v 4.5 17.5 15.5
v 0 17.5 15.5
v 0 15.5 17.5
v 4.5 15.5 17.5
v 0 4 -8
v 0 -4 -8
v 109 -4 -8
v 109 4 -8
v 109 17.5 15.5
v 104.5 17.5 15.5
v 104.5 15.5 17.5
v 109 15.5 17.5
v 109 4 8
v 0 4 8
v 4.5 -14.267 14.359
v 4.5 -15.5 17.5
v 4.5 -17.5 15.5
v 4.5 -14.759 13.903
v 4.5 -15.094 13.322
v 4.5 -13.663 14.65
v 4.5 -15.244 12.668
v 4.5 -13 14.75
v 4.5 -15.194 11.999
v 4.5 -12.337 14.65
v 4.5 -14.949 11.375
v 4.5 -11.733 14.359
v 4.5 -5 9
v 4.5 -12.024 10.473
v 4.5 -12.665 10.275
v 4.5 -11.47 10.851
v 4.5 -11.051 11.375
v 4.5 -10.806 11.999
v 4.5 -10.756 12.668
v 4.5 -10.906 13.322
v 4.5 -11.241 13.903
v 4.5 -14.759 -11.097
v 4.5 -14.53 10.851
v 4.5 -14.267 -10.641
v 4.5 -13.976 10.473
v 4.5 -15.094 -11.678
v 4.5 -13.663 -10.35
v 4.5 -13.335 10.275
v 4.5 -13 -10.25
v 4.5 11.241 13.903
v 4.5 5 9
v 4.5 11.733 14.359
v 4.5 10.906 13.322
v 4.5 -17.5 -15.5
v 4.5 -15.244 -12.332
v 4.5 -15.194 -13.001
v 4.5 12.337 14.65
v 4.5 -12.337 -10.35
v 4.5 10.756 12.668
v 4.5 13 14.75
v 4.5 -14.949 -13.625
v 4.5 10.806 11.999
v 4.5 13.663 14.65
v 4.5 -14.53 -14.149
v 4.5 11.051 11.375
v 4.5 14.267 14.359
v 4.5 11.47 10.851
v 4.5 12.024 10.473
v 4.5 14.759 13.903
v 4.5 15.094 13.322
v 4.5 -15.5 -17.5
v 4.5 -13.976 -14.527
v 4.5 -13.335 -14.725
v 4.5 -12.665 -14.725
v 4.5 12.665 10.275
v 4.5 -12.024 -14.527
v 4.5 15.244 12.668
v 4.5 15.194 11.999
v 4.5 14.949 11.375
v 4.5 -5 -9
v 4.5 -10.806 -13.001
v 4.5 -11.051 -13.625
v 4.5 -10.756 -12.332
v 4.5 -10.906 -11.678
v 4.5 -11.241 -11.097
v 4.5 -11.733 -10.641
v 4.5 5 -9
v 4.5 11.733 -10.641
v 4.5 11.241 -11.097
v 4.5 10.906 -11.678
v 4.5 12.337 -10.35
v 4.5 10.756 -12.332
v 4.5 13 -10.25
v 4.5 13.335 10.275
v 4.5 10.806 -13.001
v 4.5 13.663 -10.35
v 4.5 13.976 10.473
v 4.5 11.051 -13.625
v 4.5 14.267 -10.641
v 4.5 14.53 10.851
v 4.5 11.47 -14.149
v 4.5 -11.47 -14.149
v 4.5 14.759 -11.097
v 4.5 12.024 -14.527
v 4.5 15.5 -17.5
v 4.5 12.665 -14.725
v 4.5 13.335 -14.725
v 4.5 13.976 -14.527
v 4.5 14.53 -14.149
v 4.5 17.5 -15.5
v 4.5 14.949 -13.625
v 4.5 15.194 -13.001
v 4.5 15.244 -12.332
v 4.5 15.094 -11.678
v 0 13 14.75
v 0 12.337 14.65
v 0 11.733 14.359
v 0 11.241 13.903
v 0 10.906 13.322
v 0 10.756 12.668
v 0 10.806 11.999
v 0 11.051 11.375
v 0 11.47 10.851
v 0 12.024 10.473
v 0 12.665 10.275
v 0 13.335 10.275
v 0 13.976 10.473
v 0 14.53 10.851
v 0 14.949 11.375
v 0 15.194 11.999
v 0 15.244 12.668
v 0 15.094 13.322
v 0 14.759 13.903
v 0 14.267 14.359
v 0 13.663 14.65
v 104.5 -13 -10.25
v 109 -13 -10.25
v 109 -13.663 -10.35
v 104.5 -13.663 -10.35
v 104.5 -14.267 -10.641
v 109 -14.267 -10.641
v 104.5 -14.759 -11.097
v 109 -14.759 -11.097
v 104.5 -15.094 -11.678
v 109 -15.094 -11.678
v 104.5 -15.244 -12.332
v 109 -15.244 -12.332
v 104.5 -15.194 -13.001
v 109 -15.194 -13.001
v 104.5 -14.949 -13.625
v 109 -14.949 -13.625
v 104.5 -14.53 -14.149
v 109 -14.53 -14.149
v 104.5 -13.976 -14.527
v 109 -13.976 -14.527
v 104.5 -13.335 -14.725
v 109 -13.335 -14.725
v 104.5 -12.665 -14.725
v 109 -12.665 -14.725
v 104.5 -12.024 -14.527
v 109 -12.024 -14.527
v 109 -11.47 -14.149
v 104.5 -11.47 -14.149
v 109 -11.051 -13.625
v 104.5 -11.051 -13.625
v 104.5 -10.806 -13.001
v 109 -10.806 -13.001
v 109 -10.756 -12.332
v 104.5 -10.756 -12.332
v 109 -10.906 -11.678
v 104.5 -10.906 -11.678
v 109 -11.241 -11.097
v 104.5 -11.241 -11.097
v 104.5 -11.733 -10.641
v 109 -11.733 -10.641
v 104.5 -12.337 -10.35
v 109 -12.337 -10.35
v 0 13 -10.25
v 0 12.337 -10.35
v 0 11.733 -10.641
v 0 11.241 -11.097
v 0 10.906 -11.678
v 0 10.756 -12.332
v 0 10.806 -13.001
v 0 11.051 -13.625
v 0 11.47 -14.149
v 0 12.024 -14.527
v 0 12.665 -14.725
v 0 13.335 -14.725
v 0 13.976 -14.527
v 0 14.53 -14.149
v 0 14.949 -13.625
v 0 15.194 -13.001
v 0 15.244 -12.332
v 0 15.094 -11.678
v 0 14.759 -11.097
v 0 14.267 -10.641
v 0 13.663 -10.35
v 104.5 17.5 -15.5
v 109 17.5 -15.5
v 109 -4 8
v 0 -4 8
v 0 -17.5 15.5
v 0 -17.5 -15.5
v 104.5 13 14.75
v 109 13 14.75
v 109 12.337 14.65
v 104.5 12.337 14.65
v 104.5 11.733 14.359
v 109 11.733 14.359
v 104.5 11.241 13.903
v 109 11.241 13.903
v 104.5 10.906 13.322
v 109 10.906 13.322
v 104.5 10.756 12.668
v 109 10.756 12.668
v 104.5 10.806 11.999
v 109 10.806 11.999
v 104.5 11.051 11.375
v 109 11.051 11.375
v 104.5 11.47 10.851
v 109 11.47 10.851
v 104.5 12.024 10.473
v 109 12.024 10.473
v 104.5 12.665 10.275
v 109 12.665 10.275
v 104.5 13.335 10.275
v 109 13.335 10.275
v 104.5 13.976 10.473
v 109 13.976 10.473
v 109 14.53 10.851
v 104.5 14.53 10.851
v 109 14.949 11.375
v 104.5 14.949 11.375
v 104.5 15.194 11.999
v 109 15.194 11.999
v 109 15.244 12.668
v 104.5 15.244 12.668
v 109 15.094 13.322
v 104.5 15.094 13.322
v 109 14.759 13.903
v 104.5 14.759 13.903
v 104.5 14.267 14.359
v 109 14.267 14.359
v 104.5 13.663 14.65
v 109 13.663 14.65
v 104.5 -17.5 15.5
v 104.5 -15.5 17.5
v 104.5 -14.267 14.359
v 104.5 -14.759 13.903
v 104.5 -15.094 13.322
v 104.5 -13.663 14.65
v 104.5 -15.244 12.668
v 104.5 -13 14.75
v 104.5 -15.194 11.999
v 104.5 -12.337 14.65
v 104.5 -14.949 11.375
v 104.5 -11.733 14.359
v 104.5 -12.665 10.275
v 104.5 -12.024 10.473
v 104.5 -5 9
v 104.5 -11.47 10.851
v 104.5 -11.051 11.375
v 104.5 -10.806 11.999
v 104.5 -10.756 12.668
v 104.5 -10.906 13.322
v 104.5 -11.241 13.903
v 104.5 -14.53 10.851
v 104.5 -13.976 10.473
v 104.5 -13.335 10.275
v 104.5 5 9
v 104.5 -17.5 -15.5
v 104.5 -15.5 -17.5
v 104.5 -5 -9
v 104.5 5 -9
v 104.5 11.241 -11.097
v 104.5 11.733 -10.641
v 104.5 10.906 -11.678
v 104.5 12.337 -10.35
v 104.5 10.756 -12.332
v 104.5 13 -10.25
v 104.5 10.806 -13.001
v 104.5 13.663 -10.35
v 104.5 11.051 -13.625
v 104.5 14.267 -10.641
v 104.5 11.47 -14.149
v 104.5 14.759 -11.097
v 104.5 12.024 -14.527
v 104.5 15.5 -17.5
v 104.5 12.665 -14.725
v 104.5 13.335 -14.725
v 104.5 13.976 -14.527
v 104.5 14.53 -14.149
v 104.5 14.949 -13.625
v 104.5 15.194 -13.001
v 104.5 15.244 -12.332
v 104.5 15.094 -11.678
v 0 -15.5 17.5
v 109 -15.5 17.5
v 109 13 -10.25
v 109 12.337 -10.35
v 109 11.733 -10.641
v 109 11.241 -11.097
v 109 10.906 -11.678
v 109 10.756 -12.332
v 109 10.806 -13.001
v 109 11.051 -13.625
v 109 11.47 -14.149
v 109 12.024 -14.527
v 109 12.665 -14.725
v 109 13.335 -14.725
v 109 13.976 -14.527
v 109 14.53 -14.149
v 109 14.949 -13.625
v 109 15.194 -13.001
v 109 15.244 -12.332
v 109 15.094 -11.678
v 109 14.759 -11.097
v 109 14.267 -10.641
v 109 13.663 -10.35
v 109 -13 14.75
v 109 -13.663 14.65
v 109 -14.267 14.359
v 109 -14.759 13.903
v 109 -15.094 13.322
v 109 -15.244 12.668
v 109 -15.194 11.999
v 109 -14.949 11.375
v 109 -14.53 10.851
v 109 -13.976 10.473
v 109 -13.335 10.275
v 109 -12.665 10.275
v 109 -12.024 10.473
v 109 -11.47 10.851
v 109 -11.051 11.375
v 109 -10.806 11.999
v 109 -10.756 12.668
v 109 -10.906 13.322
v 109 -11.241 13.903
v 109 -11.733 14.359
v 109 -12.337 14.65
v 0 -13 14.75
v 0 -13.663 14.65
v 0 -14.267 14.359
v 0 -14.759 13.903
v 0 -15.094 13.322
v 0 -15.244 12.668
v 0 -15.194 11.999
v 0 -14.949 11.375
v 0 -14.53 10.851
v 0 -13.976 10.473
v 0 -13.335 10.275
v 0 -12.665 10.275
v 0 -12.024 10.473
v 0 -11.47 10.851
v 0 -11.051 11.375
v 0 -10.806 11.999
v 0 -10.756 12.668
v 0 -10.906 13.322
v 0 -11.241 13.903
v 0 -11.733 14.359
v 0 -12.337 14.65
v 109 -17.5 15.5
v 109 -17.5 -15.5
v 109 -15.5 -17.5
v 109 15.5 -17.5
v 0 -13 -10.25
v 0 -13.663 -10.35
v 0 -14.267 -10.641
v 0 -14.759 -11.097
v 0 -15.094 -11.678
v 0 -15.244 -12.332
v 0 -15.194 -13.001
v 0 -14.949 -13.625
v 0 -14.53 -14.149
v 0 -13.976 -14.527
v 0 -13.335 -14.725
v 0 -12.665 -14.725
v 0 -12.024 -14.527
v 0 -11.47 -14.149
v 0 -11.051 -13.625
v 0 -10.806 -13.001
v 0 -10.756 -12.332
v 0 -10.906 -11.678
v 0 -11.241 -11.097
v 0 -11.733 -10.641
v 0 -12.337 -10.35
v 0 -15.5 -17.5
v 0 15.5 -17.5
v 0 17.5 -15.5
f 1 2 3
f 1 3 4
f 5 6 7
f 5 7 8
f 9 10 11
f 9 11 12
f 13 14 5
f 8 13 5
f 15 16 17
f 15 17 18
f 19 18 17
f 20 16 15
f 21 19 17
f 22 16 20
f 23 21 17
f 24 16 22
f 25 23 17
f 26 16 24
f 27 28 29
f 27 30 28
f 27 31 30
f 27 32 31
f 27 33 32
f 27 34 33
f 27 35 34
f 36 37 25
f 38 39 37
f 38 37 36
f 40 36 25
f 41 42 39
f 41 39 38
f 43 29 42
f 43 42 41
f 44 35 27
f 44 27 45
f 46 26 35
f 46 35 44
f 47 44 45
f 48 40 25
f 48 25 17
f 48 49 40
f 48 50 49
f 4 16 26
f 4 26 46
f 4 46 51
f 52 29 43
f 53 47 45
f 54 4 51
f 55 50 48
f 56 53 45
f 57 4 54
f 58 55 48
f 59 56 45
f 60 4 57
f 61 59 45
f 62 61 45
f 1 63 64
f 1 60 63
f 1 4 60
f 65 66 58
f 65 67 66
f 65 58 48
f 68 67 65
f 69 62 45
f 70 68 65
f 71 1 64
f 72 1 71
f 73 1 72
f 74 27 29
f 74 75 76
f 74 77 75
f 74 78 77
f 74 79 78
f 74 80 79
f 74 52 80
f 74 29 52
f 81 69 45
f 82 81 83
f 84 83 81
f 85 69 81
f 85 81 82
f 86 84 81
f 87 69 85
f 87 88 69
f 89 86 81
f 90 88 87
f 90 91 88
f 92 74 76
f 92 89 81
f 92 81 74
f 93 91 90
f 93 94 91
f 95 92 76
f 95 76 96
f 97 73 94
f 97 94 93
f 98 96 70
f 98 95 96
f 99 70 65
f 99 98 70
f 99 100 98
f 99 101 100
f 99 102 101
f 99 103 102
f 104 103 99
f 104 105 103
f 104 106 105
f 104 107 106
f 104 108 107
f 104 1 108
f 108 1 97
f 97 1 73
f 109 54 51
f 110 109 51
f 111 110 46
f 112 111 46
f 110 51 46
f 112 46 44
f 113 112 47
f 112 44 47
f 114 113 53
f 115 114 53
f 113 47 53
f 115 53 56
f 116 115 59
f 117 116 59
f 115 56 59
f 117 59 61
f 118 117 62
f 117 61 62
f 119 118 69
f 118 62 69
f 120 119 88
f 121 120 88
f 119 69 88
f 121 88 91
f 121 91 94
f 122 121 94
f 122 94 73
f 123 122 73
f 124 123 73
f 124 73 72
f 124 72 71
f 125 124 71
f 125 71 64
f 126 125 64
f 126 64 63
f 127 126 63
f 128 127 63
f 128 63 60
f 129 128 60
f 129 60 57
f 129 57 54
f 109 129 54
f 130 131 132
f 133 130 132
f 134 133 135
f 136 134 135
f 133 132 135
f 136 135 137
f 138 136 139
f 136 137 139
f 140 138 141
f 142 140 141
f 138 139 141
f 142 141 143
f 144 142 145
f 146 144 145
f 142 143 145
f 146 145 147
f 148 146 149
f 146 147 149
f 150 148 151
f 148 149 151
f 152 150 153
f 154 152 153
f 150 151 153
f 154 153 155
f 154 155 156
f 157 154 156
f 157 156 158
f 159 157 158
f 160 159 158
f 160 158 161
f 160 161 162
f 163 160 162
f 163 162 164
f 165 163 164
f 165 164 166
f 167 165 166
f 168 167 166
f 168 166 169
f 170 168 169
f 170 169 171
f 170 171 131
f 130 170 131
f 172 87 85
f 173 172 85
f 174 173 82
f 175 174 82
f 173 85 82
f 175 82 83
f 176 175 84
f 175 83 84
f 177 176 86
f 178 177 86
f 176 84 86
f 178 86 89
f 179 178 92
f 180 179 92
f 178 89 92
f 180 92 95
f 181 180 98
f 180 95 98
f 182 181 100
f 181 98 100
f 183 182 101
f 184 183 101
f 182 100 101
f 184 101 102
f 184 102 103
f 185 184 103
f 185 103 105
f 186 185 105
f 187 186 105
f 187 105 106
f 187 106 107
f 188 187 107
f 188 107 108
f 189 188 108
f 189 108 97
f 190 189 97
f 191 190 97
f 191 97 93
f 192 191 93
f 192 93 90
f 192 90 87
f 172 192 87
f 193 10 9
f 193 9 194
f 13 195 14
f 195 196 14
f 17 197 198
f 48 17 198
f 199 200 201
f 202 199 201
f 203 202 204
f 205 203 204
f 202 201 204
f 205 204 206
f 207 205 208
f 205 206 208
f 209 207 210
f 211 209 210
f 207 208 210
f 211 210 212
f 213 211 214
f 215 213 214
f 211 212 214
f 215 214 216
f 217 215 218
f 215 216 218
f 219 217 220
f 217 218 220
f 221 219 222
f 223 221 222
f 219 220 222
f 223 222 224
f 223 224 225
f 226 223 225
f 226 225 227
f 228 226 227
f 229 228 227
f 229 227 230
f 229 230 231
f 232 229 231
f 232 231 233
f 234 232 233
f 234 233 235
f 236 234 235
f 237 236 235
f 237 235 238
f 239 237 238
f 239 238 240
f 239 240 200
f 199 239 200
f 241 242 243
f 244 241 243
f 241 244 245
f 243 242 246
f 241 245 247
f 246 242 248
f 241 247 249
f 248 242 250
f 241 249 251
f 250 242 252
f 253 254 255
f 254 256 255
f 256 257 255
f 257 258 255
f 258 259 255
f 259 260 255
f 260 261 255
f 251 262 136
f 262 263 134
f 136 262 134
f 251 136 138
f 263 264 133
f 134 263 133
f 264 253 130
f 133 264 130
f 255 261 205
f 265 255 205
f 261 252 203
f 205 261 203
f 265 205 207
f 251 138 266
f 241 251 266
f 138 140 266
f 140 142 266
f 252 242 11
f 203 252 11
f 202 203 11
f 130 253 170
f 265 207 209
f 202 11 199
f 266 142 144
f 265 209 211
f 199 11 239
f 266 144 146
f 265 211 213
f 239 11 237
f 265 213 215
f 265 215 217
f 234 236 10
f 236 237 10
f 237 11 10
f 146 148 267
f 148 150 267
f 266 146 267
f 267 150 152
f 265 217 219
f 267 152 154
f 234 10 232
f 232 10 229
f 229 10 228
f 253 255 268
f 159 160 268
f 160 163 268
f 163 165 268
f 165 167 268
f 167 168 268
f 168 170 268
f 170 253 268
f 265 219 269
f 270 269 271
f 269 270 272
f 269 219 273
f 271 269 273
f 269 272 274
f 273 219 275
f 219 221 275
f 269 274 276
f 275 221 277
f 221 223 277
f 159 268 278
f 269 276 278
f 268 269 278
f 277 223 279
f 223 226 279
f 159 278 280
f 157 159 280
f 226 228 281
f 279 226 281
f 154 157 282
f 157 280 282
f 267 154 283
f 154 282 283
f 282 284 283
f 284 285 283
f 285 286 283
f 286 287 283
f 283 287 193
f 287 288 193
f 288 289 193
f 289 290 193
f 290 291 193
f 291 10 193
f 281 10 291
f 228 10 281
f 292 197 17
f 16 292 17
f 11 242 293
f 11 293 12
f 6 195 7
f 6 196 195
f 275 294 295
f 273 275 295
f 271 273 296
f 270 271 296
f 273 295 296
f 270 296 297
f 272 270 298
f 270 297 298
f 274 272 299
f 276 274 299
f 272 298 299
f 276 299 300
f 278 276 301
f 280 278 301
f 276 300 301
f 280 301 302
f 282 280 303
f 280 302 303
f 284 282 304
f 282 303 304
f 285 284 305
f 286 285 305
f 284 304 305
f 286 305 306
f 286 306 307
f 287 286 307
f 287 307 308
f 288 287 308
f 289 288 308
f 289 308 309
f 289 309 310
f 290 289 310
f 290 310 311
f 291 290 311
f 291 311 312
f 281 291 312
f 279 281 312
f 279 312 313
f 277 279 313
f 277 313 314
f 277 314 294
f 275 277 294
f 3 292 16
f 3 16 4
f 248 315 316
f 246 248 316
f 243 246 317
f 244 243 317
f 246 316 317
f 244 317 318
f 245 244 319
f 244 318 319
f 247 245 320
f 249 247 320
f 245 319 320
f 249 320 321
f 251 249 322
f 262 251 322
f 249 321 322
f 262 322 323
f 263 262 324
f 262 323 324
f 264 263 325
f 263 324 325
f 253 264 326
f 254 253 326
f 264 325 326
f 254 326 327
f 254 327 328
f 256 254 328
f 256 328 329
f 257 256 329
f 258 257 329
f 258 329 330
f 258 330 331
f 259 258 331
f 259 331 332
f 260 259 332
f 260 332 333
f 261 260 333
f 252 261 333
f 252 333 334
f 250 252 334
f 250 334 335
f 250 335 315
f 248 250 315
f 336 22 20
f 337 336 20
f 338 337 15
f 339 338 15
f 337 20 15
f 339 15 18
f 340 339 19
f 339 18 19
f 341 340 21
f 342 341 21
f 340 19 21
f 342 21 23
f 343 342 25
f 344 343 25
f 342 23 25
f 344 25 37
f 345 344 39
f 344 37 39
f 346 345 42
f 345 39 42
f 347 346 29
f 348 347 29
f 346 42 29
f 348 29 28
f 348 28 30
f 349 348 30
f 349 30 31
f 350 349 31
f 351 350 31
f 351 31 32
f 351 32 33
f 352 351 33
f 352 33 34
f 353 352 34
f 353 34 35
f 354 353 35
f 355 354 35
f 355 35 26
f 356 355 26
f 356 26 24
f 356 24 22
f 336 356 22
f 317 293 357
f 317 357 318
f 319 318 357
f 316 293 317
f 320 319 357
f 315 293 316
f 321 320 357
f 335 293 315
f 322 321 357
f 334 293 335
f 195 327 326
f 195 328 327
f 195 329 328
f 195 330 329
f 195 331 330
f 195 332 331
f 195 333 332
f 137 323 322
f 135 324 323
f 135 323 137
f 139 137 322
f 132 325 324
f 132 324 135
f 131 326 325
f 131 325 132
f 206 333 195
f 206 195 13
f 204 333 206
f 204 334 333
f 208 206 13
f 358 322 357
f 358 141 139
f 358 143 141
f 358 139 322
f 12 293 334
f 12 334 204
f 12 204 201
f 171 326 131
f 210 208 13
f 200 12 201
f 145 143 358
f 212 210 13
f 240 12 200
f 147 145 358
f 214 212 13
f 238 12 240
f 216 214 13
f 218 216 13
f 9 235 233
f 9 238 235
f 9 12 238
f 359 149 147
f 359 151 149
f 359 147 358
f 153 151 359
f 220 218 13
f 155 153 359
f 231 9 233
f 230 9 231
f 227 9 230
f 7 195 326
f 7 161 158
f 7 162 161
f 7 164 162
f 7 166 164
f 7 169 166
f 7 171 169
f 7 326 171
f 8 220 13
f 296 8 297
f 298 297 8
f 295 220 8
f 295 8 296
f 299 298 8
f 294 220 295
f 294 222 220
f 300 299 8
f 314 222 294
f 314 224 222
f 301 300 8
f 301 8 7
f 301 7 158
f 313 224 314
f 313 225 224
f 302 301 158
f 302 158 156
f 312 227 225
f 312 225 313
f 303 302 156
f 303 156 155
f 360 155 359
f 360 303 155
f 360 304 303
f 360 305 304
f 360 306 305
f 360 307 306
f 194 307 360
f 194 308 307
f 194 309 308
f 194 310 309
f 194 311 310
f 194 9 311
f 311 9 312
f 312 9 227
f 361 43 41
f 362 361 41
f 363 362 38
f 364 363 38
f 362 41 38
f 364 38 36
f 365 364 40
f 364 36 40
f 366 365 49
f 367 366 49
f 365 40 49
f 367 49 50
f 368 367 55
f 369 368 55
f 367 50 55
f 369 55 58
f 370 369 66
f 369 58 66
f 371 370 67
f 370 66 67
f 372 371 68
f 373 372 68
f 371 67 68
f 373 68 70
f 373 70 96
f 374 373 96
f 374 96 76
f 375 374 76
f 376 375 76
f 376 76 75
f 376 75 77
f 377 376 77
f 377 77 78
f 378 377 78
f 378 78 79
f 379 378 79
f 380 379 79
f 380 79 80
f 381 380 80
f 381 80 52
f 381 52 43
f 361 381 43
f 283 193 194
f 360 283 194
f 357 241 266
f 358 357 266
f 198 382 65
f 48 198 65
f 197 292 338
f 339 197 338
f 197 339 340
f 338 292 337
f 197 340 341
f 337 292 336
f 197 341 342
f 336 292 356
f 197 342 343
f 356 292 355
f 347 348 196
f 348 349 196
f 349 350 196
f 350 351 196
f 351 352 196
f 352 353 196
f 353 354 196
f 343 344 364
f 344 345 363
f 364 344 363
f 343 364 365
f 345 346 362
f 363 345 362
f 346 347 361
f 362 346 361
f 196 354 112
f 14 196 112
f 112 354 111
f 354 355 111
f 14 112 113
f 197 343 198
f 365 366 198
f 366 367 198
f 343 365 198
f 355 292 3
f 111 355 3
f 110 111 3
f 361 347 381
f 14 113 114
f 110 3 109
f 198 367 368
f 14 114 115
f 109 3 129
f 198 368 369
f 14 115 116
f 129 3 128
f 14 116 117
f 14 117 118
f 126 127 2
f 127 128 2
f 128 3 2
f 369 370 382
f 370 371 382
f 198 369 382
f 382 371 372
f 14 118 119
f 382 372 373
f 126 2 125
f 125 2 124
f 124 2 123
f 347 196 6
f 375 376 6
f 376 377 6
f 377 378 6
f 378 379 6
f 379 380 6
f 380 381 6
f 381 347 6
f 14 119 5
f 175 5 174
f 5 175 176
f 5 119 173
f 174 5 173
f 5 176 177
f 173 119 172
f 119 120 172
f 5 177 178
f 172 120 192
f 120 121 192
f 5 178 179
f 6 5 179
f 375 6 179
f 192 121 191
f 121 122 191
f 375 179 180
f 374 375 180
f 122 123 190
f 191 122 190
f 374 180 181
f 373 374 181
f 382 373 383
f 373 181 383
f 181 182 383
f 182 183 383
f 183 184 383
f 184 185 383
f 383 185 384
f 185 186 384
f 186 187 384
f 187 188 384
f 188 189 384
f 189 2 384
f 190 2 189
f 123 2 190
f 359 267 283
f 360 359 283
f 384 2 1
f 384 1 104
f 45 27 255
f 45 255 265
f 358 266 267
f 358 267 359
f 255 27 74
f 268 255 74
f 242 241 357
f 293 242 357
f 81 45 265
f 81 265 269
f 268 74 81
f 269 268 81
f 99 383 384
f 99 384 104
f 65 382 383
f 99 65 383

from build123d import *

# Parameters (mm, degrees)
SKETCH_1_W                  = 35
SKETCH_1_H                  = 35
SKETCH_1_W_2                = 16
SKETCH_1_H_2                = 8
EXTRUDE_1_DEPTH             = 4.5
CHAMFER_1_SIZE              = 2
SKETCH_4_W                  = 18
SKETCH_4_H                  = 10
SKETCH_4_W_2                = 16
SKETCH_4_H_2                = 8
EXTRUDE_2_DEPTH             = 100
SKETCH_5_W                  = 35
SKETCH_5_H                  = 35
SKETCH_5_W_2                = 16
SKETCH_5_H_2                = 8
EXTRUDE_3_DEPTH             = 4.5
CHAMFER_2_SIZE              = 2
HOLE_WIZARD_4_5_4_5_2_D     = 4.5
PATTERN_LINEAR_1_COUNT      = 2
PATTERN_LINEAR_1_PITCH      = 25
PATTERN_LINEAR_1_COUNT_DIR2 = 2
PATTERN_LINEAR_1_PITCH_DIR2 = 26


with BuildPart() as part:
    # Эскиз1 → Бобышка-Вытянуть1 (new body)
    with BuildSketch(Plane(origin=(0, 0, 0), x_dir=(0, 0, -1), z_dir=(1, 0, 0))):
        Rectangle(SKETCH_1_W, SKETCH_1_H)
        Rectangle(SKETCH_1_W_2, SKETCH_1_H_2, mode=Mode.SUBTRACT)
    extrude(amount=EXTRUDE_1_DEPTH)

    # Фаска1
    chamfer_1_edges = [part.edges().sort_by_distance(p)[0] for p in [
        (2.25, -17.5, -17.5),
        (2.25, -17.5, 17.5),
        (2.25, 17.5, 17.5),
        (2.25, 17.5, -17.5),
    ]]
    chamfer(chamfer_1_edges, length=CHAMFER_1_SIZE)

    # Эскиз4 → Бобышка-Вытянуть2 (add)
    with BuildSketch(Plane(origin=(4.5, 0, 0), x_dir=(0, 0, -1), z_dir=(1, 0, 0))):
        Rectangle(SKETCH_4_W, SKETCH_4_H)
        Rectangle(SKETCH_4_W_2, SKETCH_4_H_2, mode=Mode.SUBTRACT)
    extrude(amount=EXTRUDE_2_DEPTH)

    # Эскиз5 → Бобышка-Вытянуть3 (add)
    with BuildSketch(Plane(origin=(104.5, 0, 0), x_dir=(0, 0, -1), z_dir=(1, 0, 0))):
        Rectangle(SKETCH_5_W, SKETCH_5_H)
        Rectangle(SKETCH_5_W_2, SKETCH_5_H_2, mode=Mode.SUBTRACT)
    extrude(amount=EXTRUDE_3_DEPTH)

    # Фаска2
    chamfer_2_edges = [part.edges().sort_by_distance(p)[0] for p in [
        (106.75, -17.5, -17.5),
        (106.75, 17.5, -17.5),
        (106.75, 17.5, 17.5),
        (106.75, -17.5, 17.5),
    ]]
    chamfer(chamfer_2_edges, length=CHAMFER_2_SIZE)

    # Диаметр отверстия Ø4.5 (4.5)2 (through all)
    with Locations(Plane(origin=(0, 13, 12.5), x_dir=(0, 0, -1), z_dir=(-1, 0, 0))):
        with Locations((0, 0)):
            hole_wizard_4_5_4_5_2 = Hole(HOLE_WIZARD_4_5_4_5_2_D / 2)

    # Линейный массив1: Hole Wizard 4.5 _4.5_2 2 × 2
    with Locations(*[(0, -j * PATTERN_LINEAR_1_PITCH_DIR2, -i * PATTERN_LINEAR_1_PITCH) for i in range(PATTERN_LINEAR_1_COUNT) for j in range(PATTERN_LINEAR_1_COUNT_DIR2) if (i, j) != (0, 0)]):
        add(hole_wizard_4_5_4_5_2, mode=Mode.SUBTRACT)


solid = part.part
